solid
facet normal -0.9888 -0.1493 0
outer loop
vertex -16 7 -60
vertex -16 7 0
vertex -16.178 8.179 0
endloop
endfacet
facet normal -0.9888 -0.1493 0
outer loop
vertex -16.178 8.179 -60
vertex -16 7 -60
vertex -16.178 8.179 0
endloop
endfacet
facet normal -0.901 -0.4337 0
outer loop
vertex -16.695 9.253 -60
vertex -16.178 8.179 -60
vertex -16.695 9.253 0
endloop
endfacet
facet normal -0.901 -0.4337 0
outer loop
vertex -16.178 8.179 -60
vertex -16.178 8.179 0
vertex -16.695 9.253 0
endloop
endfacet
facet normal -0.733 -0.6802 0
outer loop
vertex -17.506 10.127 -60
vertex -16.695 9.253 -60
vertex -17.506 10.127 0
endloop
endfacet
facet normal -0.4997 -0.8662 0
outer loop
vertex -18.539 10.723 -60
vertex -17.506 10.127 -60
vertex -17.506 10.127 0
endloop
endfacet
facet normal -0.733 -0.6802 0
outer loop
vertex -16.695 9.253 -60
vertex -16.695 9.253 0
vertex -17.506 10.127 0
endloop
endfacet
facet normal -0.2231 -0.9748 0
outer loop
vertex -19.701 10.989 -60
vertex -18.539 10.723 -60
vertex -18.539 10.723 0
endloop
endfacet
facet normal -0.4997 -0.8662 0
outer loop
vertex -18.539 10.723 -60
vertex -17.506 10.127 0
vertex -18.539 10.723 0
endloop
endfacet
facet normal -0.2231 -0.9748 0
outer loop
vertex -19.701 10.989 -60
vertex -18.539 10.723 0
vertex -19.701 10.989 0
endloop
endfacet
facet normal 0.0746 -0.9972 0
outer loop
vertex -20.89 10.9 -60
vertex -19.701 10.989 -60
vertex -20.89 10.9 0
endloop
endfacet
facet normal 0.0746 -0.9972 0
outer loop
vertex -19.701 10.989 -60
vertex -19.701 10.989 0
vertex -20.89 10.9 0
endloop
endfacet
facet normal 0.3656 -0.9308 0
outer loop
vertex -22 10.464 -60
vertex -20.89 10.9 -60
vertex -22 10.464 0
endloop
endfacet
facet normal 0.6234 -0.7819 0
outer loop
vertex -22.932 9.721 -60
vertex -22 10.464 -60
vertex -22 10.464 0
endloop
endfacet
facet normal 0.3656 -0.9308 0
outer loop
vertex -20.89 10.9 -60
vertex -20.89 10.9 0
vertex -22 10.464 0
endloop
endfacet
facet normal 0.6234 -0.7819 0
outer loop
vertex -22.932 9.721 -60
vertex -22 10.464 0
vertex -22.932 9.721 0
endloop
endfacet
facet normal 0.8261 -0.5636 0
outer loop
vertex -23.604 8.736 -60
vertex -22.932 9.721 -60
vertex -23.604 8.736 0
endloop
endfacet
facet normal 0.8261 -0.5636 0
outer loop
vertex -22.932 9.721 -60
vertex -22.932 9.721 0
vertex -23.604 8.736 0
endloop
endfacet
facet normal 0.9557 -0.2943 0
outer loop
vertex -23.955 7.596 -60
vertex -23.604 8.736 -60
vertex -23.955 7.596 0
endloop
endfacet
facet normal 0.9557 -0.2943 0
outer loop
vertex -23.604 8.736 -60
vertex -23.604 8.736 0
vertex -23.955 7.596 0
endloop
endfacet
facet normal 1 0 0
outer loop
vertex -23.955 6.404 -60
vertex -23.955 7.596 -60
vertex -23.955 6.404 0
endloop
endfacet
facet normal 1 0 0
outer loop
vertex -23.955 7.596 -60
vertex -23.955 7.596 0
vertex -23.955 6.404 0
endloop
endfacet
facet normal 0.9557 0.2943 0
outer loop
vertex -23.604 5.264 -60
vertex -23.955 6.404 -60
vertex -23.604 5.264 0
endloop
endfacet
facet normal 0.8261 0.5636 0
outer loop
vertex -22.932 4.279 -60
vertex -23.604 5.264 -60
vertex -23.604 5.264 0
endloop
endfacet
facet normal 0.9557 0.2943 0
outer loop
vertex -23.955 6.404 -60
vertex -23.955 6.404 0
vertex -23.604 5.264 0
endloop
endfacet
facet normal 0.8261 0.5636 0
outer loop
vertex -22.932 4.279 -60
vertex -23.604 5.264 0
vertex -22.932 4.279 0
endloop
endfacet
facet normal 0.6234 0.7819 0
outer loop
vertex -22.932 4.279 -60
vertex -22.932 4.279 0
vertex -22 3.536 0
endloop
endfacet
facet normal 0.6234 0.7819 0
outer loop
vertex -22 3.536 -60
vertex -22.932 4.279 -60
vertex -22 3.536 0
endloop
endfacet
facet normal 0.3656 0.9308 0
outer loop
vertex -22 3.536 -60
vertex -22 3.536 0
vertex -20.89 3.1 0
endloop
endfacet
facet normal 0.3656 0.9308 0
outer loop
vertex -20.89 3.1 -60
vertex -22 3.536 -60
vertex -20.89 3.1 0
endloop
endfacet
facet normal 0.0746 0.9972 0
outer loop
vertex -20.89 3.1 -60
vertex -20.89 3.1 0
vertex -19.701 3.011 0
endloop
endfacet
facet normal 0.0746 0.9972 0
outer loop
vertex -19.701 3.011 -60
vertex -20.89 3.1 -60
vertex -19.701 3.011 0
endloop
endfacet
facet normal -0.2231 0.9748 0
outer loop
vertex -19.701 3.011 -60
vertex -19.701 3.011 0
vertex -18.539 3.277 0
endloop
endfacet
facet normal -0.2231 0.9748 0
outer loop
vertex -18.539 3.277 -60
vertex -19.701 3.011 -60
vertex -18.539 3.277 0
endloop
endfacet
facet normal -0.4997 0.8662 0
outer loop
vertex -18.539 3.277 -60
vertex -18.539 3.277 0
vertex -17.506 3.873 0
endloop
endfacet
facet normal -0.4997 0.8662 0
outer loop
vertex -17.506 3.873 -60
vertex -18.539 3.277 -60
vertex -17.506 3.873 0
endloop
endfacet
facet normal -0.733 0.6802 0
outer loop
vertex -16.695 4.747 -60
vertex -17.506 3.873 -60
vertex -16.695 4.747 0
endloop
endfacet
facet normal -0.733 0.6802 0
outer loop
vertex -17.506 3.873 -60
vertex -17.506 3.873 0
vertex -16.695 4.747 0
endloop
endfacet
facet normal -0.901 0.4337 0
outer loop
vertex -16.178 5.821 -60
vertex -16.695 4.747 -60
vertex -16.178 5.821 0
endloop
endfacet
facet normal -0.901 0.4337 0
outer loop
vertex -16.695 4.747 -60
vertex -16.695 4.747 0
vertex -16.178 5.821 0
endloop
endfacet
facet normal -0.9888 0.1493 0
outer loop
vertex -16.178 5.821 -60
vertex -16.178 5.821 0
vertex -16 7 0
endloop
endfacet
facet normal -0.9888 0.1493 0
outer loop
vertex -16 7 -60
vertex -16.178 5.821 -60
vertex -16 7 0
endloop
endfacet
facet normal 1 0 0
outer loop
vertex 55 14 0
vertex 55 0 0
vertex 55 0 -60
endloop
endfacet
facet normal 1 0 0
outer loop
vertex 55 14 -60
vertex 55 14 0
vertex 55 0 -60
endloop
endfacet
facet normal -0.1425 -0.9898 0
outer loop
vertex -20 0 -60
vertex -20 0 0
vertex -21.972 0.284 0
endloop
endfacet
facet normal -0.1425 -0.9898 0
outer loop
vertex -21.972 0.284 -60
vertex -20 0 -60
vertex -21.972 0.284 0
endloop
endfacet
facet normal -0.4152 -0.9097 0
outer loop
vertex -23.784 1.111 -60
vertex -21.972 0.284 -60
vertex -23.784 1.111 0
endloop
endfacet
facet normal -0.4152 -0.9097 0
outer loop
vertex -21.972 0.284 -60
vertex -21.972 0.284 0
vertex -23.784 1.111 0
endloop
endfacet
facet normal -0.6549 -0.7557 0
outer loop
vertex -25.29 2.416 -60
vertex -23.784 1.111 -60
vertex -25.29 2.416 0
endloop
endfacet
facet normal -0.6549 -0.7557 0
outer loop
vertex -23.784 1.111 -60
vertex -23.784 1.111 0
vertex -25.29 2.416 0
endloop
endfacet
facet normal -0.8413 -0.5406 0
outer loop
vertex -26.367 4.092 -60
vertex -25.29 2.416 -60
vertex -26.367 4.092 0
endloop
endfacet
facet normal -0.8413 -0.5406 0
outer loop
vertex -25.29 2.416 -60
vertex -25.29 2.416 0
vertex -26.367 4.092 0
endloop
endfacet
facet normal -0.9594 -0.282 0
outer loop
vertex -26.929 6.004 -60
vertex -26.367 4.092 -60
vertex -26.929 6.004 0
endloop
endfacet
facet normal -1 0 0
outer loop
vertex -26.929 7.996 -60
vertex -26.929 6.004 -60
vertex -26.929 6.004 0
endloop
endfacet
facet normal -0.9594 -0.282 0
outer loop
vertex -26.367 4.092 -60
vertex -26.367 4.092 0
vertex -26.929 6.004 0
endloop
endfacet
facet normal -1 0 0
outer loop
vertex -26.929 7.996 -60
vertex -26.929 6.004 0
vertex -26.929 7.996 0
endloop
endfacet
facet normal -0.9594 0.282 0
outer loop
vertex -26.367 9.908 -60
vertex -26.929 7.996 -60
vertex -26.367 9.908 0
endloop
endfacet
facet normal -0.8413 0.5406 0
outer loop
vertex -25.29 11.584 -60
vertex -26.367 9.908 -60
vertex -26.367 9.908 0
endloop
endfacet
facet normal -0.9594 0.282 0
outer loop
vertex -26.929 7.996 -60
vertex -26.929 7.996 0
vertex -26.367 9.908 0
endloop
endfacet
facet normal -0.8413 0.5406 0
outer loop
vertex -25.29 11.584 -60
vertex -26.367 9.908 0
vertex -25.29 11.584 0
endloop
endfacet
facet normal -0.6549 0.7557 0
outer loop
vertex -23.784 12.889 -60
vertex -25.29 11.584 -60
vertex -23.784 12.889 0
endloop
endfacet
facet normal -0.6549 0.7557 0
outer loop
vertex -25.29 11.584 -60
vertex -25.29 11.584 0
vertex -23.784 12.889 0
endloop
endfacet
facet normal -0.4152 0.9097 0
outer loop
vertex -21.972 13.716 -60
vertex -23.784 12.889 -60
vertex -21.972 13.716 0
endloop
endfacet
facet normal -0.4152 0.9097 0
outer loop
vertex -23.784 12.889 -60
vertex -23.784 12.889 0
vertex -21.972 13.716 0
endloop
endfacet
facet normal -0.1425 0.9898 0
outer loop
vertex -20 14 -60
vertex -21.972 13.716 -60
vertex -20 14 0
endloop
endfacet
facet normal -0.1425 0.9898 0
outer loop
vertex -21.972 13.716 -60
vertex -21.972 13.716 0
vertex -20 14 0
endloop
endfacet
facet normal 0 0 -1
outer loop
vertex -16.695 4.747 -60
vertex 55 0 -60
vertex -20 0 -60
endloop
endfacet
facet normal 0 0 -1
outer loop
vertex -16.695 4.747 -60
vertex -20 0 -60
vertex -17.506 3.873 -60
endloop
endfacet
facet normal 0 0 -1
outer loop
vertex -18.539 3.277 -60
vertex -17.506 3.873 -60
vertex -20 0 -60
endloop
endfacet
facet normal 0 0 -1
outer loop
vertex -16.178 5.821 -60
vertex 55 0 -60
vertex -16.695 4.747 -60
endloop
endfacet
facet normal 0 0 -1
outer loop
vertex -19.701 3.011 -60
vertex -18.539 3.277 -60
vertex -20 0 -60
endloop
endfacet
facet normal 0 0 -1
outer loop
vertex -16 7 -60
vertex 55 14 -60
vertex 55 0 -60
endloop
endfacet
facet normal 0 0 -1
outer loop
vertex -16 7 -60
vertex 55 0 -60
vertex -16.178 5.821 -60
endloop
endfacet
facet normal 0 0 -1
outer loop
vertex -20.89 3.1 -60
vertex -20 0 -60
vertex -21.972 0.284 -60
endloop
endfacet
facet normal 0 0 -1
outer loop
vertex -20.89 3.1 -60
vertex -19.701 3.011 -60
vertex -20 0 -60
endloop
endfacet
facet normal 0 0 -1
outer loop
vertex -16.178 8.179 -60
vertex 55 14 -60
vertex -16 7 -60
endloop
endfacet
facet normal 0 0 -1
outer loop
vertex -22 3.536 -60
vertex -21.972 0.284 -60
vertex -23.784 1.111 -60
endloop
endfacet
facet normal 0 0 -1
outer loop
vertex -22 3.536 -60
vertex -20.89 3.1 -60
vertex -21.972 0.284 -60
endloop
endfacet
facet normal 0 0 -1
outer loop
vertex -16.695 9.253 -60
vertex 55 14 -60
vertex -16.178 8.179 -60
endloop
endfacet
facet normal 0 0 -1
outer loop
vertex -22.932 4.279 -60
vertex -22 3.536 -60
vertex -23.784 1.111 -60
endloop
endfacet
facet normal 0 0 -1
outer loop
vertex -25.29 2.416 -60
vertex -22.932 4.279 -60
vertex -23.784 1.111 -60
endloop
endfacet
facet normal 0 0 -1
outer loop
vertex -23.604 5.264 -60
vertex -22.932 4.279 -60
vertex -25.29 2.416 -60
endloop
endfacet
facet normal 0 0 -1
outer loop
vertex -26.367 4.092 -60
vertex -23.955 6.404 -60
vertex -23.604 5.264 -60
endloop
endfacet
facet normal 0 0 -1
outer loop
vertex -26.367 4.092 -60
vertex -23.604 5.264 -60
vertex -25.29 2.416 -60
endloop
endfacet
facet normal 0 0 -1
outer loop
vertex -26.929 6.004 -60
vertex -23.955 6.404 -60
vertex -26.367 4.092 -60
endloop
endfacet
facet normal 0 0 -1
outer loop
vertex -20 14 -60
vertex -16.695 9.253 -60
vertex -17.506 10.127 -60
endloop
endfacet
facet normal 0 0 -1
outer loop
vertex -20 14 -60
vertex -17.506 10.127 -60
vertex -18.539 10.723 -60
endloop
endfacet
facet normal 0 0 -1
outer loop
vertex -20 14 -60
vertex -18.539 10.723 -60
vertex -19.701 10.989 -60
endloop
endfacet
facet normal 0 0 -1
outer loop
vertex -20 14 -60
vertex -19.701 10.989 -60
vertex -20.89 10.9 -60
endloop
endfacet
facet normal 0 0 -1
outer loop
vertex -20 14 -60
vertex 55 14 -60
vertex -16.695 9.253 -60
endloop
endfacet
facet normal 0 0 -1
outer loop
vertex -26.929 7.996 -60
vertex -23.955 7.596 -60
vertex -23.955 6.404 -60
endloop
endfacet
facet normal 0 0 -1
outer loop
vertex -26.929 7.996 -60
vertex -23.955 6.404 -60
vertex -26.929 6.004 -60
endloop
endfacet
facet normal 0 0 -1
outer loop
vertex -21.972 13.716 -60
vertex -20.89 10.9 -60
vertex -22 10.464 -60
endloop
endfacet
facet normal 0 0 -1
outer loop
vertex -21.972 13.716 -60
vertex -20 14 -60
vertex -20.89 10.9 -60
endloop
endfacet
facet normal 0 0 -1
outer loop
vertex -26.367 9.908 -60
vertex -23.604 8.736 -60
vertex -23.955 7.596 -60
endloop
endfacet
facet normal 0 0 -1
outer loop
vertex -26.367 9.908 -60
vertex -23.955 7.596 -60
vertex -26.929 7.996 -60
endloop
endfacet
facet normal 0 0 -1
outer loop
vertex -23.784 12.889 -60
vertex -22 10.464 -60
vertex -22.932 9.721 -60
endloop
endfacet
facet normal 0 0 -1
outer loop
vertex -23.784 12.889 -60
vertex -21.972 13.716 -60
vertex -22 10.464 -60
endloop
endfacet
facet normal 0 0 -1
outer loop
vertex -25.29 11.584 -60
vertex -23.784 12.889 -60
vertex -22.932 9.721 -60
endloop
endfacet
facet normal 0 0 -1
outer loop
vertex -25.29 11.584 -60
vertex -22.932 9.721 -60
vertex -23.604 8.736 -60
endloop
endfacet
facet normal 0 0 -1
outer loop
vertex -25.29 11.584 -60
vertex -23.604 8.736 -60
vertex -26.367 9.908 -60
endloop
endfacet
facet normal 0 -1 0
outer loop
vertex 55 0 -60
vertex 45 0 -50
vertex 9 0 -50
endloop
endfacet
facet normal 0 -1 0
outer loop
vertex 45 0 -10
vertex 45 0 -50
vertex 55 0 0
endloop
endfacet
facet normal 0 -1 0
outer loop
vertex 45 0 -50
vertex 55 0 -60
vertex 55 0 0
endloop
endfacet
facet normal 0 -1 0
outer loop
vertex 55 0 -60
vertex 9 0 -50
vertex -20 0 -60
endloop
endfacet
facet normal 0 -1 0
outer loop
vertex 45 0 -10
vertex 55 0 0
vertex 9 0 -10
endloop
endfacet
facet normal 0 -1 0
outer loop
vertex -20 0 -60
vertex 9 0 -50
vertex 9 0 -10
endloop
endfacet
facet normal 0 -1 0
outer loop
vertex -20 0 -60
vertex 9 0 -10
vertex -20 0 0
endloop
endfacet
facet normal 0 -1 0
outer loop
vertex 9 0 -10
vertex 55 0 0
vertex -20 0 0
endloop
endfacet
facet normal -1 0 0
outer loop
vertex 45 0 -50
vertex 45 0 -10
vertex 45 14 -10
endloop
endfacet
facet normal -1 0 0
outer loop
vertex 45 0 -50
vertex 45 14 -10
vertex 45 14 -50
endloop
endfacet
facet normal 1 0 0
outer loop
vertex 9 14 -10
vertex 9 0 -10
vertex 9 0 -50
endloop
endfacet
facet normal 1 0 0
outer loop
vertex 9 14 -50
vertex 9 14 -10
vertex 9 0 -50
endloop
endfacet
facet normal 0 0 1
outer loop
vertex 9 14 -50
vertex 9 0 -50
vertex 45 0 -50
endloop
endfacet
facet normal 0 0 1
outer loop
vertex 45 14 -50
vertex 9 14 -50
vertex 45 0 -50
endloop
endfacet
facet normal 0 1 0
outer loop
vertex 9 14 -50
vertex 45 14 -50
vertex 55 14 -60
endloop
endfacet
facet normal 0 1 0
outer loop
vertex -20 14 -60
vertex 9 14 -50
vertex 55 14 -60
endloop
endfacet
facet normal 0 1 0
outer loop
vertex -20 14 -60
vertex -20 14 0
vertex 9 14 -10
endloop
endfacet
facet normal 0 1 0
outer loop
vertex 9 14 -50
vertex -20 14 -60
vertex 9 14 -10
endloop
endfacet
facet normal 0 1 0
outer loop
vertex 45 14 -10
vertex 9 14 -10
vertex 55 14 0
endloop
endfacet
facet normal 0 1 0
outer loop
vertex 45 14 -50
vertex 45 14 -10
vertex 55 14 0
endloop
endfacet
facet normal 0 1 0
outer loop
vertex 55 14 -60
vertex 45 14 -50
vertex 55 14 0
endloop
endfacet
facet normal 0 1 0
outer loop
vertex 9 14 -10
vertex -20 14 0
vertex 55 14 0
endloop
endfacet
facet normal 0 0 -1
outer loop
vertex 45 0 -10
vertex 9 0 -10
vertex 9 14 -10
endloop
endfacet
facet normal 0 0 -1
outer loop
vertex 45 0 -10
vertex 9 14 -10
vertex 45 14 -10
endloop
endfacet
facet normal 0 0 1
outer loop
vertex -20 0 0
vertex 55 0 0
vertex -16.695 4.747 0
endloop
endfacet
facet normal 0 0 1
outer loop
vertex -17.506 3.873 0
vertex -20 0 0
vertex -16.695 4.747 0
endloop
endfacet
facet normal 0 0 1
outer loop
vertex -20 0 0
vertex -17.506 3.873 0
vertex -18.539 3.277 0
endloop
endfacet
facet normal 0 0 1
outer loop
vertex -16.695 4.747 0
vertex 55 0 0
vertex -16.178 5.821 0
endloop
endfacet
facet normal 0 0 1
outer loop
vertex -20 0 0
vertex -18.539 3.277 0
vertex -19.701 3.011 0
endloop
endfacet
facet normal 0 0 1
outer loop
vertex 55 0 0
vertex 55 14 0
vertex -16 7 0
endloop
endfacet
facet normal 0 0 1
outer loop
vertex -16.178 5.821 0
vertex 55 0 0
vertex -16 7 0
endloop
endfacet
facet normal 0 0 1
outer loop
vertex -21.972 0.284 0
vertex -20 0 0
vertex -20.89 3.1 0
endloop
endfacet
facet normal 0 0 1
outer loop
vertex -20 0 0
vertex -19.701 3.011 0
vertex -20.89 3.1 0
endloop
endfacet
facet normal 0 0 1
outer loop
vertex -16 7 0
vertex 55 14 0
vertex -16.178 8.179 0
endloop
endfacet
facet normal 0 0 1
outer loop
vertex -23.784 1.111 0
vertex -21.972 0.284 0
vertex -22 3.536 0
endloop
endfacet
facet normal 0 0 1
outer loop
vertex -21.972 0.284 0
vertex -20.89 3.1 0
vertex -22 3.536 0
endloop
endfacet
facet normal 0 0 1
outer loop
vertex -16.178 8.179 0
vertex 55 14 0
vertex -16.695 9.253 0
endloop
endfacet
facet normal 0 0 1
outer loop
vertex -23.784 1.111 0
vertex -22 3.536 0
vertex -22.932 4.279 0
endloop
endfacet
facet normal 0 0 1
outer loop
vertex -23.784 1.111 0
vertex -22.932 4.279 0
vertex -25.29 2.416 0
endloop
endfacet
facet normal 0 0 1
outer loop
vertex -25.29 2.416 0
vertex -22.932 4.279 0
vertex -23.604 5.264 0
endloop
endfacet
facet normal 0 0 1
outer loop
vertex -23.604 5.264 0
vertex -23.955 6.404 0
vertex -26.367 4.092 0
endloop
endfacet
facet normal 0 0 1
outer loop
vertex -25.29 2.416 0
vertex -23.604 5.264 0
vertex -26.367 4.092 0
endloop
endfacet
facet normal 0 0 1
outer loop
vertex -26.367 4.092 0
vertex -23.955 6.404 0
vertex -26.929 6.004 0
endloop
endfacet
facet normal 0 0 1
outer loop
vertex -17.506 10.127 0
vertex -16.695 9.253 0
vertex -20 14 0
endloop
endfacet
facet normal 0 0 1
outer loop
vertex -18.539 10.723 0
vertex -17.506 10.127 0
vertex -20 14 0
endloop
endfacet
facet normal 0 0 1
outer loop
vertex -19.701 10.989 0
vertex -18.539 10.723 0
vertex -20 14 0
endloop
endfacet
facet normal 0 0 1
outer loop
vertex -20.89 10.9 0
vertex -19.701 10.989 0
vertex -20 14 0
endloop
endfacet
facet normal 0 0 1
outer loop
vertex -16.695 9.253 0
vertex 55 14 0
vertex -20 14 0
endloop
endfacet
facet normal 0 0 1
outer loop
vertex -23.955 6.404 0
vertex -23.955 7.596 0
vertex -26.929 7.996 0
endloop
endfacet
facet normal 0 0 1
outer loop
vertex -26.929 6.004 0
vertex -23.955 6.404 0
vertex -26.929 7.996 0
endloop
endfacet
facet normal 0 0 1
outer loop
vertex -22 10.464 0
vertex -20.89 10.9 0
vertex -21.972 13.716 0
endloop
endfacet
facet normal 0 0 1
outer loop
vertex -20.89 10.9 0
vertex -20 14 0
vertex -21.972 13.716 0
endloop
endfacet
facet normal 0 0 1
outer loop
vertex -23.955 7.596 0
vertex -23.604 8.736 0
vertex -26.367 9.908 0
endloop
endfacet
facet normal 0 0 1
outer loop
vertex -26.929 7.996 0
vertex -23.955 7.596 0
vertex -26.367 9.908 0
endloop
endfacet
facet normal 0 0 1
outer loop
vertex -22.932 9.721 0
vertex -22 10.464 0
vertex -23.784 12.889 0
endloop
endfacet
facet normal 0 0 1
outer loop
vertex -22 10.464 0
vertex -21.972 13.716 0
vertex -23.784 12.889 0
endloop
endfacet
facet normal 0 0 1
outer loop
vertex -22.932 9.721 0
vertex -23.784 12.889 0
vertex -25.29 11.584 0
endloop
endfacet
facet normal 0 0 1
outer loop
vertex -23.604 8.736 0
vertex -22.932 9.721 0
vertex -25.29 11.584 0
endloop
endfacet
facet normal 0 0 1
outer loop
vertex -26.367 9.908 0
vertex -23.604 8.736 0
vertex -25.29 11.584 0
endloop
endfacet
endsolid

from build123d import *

# Parameters (mm, degrees)
SKETCH_1_W      = 55
SKETCH_1_H      = 60
SKETCH_1_W_2    = 36
SKETCH_1_H_2    = 40
EXTRUDE_1_DEPTH = 14
SKETCH_2_R      = 4
EXTRUDE_2_DEPTH = 60


with BuildPart() as part:
    # 草图1 → 凸台-拉伸1 (new body)
    with BuildSketch(Plane(origin=(0, 0, 0), x_dir=(1, 0, 0), z_dir=(0, 1, 0))):
        with Locations((27.5, 30)):
            Rectangle(SKETCH_1_W, SKETCH_1_H)
        with Locations((27, 30)):
            Rectangle(SKETCH_1_W_2, SKETCH_1_H_2, mode=Mode.SUBTRACT)
    extrude(amount=EXTRUDE_1_DEPTH)

    # 草图2 → 凸台-拉伸2 (add)
    with BuildSketch(Plane.XY):
        with BuildLine():
            Line((0, 0), (-20, 0))
            ThreePointArc((-20, 0), (-27, 7), (-20, 14))
            Line((-20, 14), (0, 14))
            Line((0, 14), (0, 0))
        make_face()
        with Locations((-20, 7)):
            Circle(SKETCH_2_R, mode=Mode.SUBTRACT)
    extrude(amount=-EXTRUDE_2_DEPTH)


solid = part.part
